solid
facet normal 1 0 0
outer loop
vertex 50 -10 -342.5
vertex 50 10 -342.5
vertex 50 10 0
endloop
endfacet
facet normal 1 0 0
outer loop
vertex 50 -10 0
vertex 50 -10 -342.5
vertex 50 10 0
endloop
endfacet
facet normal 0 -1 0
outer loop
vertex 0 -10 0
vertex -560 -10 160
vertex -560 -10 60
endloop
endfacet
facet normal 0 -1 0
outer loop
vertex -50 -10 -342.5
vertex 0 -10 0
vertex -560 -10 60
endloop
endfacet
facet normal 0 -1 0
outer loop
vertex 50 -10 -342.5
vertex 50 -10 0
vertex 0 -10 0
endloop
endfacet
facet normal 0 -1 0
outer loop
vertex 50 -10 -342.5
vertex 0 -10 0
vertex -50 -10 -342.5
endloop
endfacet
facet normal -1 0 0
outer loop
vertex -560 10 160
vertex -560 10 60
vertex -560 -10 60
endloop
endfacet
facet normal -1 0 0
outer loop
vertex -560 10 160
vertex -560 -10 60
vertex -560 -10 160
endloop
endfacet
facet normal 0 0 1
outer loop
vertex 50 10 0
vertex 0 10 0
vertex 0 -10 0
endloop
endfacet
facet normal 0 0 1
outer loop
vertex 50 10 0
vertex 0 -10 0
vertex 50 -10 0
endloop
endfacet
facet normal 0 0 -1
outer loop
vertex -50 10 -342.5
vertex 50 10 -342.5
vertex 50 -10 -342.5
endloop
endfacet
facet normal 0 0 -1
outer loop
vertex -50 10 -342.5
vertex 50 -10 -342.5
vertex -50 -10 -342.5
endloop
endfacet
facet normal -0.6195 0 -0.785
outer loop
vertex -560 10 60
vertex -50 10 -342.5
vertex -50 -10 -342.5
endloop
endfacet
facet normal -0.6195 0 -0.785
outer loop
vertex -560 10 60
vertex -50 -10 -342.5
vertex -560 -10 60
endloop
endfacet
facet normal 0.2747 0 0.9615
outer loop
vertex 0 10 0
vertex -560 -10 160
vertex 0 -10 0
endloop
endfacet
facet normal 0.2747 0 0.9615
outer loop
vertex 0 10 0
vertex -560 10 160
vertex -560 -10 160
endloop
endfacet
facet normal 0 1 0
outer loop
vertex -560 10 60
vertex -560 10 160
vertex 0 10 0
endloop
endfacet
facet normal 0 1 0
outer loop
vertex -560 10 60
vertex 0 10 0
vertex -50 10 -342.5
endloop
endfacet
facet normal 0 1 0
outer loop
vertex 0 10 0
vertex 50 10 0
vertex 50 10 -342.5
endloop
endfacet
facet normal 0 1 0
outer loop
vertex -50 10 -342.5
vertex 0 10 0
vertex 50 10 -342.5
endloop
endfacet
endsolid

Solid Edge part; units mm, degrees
sketch "Sketch1" plane through (0, 0, 0) normal (0, -1, 0) x (1, 0, 0)
  line L0 (50, -342.5) -> (50, 0)
  line L1 (0, 0) -> (50, 0)
  line L2 (-560, 160) -> (0, 0)
  line L3 (-560, 60) -> (-560, 160)
  line L4 (-50, -342.5) -> (-560, 60)
  line L5 (50, -342.5) -> (-50, -342.5)
extrude "Protrusion1" add sketch "Sketch1" along normal mid plane 20
